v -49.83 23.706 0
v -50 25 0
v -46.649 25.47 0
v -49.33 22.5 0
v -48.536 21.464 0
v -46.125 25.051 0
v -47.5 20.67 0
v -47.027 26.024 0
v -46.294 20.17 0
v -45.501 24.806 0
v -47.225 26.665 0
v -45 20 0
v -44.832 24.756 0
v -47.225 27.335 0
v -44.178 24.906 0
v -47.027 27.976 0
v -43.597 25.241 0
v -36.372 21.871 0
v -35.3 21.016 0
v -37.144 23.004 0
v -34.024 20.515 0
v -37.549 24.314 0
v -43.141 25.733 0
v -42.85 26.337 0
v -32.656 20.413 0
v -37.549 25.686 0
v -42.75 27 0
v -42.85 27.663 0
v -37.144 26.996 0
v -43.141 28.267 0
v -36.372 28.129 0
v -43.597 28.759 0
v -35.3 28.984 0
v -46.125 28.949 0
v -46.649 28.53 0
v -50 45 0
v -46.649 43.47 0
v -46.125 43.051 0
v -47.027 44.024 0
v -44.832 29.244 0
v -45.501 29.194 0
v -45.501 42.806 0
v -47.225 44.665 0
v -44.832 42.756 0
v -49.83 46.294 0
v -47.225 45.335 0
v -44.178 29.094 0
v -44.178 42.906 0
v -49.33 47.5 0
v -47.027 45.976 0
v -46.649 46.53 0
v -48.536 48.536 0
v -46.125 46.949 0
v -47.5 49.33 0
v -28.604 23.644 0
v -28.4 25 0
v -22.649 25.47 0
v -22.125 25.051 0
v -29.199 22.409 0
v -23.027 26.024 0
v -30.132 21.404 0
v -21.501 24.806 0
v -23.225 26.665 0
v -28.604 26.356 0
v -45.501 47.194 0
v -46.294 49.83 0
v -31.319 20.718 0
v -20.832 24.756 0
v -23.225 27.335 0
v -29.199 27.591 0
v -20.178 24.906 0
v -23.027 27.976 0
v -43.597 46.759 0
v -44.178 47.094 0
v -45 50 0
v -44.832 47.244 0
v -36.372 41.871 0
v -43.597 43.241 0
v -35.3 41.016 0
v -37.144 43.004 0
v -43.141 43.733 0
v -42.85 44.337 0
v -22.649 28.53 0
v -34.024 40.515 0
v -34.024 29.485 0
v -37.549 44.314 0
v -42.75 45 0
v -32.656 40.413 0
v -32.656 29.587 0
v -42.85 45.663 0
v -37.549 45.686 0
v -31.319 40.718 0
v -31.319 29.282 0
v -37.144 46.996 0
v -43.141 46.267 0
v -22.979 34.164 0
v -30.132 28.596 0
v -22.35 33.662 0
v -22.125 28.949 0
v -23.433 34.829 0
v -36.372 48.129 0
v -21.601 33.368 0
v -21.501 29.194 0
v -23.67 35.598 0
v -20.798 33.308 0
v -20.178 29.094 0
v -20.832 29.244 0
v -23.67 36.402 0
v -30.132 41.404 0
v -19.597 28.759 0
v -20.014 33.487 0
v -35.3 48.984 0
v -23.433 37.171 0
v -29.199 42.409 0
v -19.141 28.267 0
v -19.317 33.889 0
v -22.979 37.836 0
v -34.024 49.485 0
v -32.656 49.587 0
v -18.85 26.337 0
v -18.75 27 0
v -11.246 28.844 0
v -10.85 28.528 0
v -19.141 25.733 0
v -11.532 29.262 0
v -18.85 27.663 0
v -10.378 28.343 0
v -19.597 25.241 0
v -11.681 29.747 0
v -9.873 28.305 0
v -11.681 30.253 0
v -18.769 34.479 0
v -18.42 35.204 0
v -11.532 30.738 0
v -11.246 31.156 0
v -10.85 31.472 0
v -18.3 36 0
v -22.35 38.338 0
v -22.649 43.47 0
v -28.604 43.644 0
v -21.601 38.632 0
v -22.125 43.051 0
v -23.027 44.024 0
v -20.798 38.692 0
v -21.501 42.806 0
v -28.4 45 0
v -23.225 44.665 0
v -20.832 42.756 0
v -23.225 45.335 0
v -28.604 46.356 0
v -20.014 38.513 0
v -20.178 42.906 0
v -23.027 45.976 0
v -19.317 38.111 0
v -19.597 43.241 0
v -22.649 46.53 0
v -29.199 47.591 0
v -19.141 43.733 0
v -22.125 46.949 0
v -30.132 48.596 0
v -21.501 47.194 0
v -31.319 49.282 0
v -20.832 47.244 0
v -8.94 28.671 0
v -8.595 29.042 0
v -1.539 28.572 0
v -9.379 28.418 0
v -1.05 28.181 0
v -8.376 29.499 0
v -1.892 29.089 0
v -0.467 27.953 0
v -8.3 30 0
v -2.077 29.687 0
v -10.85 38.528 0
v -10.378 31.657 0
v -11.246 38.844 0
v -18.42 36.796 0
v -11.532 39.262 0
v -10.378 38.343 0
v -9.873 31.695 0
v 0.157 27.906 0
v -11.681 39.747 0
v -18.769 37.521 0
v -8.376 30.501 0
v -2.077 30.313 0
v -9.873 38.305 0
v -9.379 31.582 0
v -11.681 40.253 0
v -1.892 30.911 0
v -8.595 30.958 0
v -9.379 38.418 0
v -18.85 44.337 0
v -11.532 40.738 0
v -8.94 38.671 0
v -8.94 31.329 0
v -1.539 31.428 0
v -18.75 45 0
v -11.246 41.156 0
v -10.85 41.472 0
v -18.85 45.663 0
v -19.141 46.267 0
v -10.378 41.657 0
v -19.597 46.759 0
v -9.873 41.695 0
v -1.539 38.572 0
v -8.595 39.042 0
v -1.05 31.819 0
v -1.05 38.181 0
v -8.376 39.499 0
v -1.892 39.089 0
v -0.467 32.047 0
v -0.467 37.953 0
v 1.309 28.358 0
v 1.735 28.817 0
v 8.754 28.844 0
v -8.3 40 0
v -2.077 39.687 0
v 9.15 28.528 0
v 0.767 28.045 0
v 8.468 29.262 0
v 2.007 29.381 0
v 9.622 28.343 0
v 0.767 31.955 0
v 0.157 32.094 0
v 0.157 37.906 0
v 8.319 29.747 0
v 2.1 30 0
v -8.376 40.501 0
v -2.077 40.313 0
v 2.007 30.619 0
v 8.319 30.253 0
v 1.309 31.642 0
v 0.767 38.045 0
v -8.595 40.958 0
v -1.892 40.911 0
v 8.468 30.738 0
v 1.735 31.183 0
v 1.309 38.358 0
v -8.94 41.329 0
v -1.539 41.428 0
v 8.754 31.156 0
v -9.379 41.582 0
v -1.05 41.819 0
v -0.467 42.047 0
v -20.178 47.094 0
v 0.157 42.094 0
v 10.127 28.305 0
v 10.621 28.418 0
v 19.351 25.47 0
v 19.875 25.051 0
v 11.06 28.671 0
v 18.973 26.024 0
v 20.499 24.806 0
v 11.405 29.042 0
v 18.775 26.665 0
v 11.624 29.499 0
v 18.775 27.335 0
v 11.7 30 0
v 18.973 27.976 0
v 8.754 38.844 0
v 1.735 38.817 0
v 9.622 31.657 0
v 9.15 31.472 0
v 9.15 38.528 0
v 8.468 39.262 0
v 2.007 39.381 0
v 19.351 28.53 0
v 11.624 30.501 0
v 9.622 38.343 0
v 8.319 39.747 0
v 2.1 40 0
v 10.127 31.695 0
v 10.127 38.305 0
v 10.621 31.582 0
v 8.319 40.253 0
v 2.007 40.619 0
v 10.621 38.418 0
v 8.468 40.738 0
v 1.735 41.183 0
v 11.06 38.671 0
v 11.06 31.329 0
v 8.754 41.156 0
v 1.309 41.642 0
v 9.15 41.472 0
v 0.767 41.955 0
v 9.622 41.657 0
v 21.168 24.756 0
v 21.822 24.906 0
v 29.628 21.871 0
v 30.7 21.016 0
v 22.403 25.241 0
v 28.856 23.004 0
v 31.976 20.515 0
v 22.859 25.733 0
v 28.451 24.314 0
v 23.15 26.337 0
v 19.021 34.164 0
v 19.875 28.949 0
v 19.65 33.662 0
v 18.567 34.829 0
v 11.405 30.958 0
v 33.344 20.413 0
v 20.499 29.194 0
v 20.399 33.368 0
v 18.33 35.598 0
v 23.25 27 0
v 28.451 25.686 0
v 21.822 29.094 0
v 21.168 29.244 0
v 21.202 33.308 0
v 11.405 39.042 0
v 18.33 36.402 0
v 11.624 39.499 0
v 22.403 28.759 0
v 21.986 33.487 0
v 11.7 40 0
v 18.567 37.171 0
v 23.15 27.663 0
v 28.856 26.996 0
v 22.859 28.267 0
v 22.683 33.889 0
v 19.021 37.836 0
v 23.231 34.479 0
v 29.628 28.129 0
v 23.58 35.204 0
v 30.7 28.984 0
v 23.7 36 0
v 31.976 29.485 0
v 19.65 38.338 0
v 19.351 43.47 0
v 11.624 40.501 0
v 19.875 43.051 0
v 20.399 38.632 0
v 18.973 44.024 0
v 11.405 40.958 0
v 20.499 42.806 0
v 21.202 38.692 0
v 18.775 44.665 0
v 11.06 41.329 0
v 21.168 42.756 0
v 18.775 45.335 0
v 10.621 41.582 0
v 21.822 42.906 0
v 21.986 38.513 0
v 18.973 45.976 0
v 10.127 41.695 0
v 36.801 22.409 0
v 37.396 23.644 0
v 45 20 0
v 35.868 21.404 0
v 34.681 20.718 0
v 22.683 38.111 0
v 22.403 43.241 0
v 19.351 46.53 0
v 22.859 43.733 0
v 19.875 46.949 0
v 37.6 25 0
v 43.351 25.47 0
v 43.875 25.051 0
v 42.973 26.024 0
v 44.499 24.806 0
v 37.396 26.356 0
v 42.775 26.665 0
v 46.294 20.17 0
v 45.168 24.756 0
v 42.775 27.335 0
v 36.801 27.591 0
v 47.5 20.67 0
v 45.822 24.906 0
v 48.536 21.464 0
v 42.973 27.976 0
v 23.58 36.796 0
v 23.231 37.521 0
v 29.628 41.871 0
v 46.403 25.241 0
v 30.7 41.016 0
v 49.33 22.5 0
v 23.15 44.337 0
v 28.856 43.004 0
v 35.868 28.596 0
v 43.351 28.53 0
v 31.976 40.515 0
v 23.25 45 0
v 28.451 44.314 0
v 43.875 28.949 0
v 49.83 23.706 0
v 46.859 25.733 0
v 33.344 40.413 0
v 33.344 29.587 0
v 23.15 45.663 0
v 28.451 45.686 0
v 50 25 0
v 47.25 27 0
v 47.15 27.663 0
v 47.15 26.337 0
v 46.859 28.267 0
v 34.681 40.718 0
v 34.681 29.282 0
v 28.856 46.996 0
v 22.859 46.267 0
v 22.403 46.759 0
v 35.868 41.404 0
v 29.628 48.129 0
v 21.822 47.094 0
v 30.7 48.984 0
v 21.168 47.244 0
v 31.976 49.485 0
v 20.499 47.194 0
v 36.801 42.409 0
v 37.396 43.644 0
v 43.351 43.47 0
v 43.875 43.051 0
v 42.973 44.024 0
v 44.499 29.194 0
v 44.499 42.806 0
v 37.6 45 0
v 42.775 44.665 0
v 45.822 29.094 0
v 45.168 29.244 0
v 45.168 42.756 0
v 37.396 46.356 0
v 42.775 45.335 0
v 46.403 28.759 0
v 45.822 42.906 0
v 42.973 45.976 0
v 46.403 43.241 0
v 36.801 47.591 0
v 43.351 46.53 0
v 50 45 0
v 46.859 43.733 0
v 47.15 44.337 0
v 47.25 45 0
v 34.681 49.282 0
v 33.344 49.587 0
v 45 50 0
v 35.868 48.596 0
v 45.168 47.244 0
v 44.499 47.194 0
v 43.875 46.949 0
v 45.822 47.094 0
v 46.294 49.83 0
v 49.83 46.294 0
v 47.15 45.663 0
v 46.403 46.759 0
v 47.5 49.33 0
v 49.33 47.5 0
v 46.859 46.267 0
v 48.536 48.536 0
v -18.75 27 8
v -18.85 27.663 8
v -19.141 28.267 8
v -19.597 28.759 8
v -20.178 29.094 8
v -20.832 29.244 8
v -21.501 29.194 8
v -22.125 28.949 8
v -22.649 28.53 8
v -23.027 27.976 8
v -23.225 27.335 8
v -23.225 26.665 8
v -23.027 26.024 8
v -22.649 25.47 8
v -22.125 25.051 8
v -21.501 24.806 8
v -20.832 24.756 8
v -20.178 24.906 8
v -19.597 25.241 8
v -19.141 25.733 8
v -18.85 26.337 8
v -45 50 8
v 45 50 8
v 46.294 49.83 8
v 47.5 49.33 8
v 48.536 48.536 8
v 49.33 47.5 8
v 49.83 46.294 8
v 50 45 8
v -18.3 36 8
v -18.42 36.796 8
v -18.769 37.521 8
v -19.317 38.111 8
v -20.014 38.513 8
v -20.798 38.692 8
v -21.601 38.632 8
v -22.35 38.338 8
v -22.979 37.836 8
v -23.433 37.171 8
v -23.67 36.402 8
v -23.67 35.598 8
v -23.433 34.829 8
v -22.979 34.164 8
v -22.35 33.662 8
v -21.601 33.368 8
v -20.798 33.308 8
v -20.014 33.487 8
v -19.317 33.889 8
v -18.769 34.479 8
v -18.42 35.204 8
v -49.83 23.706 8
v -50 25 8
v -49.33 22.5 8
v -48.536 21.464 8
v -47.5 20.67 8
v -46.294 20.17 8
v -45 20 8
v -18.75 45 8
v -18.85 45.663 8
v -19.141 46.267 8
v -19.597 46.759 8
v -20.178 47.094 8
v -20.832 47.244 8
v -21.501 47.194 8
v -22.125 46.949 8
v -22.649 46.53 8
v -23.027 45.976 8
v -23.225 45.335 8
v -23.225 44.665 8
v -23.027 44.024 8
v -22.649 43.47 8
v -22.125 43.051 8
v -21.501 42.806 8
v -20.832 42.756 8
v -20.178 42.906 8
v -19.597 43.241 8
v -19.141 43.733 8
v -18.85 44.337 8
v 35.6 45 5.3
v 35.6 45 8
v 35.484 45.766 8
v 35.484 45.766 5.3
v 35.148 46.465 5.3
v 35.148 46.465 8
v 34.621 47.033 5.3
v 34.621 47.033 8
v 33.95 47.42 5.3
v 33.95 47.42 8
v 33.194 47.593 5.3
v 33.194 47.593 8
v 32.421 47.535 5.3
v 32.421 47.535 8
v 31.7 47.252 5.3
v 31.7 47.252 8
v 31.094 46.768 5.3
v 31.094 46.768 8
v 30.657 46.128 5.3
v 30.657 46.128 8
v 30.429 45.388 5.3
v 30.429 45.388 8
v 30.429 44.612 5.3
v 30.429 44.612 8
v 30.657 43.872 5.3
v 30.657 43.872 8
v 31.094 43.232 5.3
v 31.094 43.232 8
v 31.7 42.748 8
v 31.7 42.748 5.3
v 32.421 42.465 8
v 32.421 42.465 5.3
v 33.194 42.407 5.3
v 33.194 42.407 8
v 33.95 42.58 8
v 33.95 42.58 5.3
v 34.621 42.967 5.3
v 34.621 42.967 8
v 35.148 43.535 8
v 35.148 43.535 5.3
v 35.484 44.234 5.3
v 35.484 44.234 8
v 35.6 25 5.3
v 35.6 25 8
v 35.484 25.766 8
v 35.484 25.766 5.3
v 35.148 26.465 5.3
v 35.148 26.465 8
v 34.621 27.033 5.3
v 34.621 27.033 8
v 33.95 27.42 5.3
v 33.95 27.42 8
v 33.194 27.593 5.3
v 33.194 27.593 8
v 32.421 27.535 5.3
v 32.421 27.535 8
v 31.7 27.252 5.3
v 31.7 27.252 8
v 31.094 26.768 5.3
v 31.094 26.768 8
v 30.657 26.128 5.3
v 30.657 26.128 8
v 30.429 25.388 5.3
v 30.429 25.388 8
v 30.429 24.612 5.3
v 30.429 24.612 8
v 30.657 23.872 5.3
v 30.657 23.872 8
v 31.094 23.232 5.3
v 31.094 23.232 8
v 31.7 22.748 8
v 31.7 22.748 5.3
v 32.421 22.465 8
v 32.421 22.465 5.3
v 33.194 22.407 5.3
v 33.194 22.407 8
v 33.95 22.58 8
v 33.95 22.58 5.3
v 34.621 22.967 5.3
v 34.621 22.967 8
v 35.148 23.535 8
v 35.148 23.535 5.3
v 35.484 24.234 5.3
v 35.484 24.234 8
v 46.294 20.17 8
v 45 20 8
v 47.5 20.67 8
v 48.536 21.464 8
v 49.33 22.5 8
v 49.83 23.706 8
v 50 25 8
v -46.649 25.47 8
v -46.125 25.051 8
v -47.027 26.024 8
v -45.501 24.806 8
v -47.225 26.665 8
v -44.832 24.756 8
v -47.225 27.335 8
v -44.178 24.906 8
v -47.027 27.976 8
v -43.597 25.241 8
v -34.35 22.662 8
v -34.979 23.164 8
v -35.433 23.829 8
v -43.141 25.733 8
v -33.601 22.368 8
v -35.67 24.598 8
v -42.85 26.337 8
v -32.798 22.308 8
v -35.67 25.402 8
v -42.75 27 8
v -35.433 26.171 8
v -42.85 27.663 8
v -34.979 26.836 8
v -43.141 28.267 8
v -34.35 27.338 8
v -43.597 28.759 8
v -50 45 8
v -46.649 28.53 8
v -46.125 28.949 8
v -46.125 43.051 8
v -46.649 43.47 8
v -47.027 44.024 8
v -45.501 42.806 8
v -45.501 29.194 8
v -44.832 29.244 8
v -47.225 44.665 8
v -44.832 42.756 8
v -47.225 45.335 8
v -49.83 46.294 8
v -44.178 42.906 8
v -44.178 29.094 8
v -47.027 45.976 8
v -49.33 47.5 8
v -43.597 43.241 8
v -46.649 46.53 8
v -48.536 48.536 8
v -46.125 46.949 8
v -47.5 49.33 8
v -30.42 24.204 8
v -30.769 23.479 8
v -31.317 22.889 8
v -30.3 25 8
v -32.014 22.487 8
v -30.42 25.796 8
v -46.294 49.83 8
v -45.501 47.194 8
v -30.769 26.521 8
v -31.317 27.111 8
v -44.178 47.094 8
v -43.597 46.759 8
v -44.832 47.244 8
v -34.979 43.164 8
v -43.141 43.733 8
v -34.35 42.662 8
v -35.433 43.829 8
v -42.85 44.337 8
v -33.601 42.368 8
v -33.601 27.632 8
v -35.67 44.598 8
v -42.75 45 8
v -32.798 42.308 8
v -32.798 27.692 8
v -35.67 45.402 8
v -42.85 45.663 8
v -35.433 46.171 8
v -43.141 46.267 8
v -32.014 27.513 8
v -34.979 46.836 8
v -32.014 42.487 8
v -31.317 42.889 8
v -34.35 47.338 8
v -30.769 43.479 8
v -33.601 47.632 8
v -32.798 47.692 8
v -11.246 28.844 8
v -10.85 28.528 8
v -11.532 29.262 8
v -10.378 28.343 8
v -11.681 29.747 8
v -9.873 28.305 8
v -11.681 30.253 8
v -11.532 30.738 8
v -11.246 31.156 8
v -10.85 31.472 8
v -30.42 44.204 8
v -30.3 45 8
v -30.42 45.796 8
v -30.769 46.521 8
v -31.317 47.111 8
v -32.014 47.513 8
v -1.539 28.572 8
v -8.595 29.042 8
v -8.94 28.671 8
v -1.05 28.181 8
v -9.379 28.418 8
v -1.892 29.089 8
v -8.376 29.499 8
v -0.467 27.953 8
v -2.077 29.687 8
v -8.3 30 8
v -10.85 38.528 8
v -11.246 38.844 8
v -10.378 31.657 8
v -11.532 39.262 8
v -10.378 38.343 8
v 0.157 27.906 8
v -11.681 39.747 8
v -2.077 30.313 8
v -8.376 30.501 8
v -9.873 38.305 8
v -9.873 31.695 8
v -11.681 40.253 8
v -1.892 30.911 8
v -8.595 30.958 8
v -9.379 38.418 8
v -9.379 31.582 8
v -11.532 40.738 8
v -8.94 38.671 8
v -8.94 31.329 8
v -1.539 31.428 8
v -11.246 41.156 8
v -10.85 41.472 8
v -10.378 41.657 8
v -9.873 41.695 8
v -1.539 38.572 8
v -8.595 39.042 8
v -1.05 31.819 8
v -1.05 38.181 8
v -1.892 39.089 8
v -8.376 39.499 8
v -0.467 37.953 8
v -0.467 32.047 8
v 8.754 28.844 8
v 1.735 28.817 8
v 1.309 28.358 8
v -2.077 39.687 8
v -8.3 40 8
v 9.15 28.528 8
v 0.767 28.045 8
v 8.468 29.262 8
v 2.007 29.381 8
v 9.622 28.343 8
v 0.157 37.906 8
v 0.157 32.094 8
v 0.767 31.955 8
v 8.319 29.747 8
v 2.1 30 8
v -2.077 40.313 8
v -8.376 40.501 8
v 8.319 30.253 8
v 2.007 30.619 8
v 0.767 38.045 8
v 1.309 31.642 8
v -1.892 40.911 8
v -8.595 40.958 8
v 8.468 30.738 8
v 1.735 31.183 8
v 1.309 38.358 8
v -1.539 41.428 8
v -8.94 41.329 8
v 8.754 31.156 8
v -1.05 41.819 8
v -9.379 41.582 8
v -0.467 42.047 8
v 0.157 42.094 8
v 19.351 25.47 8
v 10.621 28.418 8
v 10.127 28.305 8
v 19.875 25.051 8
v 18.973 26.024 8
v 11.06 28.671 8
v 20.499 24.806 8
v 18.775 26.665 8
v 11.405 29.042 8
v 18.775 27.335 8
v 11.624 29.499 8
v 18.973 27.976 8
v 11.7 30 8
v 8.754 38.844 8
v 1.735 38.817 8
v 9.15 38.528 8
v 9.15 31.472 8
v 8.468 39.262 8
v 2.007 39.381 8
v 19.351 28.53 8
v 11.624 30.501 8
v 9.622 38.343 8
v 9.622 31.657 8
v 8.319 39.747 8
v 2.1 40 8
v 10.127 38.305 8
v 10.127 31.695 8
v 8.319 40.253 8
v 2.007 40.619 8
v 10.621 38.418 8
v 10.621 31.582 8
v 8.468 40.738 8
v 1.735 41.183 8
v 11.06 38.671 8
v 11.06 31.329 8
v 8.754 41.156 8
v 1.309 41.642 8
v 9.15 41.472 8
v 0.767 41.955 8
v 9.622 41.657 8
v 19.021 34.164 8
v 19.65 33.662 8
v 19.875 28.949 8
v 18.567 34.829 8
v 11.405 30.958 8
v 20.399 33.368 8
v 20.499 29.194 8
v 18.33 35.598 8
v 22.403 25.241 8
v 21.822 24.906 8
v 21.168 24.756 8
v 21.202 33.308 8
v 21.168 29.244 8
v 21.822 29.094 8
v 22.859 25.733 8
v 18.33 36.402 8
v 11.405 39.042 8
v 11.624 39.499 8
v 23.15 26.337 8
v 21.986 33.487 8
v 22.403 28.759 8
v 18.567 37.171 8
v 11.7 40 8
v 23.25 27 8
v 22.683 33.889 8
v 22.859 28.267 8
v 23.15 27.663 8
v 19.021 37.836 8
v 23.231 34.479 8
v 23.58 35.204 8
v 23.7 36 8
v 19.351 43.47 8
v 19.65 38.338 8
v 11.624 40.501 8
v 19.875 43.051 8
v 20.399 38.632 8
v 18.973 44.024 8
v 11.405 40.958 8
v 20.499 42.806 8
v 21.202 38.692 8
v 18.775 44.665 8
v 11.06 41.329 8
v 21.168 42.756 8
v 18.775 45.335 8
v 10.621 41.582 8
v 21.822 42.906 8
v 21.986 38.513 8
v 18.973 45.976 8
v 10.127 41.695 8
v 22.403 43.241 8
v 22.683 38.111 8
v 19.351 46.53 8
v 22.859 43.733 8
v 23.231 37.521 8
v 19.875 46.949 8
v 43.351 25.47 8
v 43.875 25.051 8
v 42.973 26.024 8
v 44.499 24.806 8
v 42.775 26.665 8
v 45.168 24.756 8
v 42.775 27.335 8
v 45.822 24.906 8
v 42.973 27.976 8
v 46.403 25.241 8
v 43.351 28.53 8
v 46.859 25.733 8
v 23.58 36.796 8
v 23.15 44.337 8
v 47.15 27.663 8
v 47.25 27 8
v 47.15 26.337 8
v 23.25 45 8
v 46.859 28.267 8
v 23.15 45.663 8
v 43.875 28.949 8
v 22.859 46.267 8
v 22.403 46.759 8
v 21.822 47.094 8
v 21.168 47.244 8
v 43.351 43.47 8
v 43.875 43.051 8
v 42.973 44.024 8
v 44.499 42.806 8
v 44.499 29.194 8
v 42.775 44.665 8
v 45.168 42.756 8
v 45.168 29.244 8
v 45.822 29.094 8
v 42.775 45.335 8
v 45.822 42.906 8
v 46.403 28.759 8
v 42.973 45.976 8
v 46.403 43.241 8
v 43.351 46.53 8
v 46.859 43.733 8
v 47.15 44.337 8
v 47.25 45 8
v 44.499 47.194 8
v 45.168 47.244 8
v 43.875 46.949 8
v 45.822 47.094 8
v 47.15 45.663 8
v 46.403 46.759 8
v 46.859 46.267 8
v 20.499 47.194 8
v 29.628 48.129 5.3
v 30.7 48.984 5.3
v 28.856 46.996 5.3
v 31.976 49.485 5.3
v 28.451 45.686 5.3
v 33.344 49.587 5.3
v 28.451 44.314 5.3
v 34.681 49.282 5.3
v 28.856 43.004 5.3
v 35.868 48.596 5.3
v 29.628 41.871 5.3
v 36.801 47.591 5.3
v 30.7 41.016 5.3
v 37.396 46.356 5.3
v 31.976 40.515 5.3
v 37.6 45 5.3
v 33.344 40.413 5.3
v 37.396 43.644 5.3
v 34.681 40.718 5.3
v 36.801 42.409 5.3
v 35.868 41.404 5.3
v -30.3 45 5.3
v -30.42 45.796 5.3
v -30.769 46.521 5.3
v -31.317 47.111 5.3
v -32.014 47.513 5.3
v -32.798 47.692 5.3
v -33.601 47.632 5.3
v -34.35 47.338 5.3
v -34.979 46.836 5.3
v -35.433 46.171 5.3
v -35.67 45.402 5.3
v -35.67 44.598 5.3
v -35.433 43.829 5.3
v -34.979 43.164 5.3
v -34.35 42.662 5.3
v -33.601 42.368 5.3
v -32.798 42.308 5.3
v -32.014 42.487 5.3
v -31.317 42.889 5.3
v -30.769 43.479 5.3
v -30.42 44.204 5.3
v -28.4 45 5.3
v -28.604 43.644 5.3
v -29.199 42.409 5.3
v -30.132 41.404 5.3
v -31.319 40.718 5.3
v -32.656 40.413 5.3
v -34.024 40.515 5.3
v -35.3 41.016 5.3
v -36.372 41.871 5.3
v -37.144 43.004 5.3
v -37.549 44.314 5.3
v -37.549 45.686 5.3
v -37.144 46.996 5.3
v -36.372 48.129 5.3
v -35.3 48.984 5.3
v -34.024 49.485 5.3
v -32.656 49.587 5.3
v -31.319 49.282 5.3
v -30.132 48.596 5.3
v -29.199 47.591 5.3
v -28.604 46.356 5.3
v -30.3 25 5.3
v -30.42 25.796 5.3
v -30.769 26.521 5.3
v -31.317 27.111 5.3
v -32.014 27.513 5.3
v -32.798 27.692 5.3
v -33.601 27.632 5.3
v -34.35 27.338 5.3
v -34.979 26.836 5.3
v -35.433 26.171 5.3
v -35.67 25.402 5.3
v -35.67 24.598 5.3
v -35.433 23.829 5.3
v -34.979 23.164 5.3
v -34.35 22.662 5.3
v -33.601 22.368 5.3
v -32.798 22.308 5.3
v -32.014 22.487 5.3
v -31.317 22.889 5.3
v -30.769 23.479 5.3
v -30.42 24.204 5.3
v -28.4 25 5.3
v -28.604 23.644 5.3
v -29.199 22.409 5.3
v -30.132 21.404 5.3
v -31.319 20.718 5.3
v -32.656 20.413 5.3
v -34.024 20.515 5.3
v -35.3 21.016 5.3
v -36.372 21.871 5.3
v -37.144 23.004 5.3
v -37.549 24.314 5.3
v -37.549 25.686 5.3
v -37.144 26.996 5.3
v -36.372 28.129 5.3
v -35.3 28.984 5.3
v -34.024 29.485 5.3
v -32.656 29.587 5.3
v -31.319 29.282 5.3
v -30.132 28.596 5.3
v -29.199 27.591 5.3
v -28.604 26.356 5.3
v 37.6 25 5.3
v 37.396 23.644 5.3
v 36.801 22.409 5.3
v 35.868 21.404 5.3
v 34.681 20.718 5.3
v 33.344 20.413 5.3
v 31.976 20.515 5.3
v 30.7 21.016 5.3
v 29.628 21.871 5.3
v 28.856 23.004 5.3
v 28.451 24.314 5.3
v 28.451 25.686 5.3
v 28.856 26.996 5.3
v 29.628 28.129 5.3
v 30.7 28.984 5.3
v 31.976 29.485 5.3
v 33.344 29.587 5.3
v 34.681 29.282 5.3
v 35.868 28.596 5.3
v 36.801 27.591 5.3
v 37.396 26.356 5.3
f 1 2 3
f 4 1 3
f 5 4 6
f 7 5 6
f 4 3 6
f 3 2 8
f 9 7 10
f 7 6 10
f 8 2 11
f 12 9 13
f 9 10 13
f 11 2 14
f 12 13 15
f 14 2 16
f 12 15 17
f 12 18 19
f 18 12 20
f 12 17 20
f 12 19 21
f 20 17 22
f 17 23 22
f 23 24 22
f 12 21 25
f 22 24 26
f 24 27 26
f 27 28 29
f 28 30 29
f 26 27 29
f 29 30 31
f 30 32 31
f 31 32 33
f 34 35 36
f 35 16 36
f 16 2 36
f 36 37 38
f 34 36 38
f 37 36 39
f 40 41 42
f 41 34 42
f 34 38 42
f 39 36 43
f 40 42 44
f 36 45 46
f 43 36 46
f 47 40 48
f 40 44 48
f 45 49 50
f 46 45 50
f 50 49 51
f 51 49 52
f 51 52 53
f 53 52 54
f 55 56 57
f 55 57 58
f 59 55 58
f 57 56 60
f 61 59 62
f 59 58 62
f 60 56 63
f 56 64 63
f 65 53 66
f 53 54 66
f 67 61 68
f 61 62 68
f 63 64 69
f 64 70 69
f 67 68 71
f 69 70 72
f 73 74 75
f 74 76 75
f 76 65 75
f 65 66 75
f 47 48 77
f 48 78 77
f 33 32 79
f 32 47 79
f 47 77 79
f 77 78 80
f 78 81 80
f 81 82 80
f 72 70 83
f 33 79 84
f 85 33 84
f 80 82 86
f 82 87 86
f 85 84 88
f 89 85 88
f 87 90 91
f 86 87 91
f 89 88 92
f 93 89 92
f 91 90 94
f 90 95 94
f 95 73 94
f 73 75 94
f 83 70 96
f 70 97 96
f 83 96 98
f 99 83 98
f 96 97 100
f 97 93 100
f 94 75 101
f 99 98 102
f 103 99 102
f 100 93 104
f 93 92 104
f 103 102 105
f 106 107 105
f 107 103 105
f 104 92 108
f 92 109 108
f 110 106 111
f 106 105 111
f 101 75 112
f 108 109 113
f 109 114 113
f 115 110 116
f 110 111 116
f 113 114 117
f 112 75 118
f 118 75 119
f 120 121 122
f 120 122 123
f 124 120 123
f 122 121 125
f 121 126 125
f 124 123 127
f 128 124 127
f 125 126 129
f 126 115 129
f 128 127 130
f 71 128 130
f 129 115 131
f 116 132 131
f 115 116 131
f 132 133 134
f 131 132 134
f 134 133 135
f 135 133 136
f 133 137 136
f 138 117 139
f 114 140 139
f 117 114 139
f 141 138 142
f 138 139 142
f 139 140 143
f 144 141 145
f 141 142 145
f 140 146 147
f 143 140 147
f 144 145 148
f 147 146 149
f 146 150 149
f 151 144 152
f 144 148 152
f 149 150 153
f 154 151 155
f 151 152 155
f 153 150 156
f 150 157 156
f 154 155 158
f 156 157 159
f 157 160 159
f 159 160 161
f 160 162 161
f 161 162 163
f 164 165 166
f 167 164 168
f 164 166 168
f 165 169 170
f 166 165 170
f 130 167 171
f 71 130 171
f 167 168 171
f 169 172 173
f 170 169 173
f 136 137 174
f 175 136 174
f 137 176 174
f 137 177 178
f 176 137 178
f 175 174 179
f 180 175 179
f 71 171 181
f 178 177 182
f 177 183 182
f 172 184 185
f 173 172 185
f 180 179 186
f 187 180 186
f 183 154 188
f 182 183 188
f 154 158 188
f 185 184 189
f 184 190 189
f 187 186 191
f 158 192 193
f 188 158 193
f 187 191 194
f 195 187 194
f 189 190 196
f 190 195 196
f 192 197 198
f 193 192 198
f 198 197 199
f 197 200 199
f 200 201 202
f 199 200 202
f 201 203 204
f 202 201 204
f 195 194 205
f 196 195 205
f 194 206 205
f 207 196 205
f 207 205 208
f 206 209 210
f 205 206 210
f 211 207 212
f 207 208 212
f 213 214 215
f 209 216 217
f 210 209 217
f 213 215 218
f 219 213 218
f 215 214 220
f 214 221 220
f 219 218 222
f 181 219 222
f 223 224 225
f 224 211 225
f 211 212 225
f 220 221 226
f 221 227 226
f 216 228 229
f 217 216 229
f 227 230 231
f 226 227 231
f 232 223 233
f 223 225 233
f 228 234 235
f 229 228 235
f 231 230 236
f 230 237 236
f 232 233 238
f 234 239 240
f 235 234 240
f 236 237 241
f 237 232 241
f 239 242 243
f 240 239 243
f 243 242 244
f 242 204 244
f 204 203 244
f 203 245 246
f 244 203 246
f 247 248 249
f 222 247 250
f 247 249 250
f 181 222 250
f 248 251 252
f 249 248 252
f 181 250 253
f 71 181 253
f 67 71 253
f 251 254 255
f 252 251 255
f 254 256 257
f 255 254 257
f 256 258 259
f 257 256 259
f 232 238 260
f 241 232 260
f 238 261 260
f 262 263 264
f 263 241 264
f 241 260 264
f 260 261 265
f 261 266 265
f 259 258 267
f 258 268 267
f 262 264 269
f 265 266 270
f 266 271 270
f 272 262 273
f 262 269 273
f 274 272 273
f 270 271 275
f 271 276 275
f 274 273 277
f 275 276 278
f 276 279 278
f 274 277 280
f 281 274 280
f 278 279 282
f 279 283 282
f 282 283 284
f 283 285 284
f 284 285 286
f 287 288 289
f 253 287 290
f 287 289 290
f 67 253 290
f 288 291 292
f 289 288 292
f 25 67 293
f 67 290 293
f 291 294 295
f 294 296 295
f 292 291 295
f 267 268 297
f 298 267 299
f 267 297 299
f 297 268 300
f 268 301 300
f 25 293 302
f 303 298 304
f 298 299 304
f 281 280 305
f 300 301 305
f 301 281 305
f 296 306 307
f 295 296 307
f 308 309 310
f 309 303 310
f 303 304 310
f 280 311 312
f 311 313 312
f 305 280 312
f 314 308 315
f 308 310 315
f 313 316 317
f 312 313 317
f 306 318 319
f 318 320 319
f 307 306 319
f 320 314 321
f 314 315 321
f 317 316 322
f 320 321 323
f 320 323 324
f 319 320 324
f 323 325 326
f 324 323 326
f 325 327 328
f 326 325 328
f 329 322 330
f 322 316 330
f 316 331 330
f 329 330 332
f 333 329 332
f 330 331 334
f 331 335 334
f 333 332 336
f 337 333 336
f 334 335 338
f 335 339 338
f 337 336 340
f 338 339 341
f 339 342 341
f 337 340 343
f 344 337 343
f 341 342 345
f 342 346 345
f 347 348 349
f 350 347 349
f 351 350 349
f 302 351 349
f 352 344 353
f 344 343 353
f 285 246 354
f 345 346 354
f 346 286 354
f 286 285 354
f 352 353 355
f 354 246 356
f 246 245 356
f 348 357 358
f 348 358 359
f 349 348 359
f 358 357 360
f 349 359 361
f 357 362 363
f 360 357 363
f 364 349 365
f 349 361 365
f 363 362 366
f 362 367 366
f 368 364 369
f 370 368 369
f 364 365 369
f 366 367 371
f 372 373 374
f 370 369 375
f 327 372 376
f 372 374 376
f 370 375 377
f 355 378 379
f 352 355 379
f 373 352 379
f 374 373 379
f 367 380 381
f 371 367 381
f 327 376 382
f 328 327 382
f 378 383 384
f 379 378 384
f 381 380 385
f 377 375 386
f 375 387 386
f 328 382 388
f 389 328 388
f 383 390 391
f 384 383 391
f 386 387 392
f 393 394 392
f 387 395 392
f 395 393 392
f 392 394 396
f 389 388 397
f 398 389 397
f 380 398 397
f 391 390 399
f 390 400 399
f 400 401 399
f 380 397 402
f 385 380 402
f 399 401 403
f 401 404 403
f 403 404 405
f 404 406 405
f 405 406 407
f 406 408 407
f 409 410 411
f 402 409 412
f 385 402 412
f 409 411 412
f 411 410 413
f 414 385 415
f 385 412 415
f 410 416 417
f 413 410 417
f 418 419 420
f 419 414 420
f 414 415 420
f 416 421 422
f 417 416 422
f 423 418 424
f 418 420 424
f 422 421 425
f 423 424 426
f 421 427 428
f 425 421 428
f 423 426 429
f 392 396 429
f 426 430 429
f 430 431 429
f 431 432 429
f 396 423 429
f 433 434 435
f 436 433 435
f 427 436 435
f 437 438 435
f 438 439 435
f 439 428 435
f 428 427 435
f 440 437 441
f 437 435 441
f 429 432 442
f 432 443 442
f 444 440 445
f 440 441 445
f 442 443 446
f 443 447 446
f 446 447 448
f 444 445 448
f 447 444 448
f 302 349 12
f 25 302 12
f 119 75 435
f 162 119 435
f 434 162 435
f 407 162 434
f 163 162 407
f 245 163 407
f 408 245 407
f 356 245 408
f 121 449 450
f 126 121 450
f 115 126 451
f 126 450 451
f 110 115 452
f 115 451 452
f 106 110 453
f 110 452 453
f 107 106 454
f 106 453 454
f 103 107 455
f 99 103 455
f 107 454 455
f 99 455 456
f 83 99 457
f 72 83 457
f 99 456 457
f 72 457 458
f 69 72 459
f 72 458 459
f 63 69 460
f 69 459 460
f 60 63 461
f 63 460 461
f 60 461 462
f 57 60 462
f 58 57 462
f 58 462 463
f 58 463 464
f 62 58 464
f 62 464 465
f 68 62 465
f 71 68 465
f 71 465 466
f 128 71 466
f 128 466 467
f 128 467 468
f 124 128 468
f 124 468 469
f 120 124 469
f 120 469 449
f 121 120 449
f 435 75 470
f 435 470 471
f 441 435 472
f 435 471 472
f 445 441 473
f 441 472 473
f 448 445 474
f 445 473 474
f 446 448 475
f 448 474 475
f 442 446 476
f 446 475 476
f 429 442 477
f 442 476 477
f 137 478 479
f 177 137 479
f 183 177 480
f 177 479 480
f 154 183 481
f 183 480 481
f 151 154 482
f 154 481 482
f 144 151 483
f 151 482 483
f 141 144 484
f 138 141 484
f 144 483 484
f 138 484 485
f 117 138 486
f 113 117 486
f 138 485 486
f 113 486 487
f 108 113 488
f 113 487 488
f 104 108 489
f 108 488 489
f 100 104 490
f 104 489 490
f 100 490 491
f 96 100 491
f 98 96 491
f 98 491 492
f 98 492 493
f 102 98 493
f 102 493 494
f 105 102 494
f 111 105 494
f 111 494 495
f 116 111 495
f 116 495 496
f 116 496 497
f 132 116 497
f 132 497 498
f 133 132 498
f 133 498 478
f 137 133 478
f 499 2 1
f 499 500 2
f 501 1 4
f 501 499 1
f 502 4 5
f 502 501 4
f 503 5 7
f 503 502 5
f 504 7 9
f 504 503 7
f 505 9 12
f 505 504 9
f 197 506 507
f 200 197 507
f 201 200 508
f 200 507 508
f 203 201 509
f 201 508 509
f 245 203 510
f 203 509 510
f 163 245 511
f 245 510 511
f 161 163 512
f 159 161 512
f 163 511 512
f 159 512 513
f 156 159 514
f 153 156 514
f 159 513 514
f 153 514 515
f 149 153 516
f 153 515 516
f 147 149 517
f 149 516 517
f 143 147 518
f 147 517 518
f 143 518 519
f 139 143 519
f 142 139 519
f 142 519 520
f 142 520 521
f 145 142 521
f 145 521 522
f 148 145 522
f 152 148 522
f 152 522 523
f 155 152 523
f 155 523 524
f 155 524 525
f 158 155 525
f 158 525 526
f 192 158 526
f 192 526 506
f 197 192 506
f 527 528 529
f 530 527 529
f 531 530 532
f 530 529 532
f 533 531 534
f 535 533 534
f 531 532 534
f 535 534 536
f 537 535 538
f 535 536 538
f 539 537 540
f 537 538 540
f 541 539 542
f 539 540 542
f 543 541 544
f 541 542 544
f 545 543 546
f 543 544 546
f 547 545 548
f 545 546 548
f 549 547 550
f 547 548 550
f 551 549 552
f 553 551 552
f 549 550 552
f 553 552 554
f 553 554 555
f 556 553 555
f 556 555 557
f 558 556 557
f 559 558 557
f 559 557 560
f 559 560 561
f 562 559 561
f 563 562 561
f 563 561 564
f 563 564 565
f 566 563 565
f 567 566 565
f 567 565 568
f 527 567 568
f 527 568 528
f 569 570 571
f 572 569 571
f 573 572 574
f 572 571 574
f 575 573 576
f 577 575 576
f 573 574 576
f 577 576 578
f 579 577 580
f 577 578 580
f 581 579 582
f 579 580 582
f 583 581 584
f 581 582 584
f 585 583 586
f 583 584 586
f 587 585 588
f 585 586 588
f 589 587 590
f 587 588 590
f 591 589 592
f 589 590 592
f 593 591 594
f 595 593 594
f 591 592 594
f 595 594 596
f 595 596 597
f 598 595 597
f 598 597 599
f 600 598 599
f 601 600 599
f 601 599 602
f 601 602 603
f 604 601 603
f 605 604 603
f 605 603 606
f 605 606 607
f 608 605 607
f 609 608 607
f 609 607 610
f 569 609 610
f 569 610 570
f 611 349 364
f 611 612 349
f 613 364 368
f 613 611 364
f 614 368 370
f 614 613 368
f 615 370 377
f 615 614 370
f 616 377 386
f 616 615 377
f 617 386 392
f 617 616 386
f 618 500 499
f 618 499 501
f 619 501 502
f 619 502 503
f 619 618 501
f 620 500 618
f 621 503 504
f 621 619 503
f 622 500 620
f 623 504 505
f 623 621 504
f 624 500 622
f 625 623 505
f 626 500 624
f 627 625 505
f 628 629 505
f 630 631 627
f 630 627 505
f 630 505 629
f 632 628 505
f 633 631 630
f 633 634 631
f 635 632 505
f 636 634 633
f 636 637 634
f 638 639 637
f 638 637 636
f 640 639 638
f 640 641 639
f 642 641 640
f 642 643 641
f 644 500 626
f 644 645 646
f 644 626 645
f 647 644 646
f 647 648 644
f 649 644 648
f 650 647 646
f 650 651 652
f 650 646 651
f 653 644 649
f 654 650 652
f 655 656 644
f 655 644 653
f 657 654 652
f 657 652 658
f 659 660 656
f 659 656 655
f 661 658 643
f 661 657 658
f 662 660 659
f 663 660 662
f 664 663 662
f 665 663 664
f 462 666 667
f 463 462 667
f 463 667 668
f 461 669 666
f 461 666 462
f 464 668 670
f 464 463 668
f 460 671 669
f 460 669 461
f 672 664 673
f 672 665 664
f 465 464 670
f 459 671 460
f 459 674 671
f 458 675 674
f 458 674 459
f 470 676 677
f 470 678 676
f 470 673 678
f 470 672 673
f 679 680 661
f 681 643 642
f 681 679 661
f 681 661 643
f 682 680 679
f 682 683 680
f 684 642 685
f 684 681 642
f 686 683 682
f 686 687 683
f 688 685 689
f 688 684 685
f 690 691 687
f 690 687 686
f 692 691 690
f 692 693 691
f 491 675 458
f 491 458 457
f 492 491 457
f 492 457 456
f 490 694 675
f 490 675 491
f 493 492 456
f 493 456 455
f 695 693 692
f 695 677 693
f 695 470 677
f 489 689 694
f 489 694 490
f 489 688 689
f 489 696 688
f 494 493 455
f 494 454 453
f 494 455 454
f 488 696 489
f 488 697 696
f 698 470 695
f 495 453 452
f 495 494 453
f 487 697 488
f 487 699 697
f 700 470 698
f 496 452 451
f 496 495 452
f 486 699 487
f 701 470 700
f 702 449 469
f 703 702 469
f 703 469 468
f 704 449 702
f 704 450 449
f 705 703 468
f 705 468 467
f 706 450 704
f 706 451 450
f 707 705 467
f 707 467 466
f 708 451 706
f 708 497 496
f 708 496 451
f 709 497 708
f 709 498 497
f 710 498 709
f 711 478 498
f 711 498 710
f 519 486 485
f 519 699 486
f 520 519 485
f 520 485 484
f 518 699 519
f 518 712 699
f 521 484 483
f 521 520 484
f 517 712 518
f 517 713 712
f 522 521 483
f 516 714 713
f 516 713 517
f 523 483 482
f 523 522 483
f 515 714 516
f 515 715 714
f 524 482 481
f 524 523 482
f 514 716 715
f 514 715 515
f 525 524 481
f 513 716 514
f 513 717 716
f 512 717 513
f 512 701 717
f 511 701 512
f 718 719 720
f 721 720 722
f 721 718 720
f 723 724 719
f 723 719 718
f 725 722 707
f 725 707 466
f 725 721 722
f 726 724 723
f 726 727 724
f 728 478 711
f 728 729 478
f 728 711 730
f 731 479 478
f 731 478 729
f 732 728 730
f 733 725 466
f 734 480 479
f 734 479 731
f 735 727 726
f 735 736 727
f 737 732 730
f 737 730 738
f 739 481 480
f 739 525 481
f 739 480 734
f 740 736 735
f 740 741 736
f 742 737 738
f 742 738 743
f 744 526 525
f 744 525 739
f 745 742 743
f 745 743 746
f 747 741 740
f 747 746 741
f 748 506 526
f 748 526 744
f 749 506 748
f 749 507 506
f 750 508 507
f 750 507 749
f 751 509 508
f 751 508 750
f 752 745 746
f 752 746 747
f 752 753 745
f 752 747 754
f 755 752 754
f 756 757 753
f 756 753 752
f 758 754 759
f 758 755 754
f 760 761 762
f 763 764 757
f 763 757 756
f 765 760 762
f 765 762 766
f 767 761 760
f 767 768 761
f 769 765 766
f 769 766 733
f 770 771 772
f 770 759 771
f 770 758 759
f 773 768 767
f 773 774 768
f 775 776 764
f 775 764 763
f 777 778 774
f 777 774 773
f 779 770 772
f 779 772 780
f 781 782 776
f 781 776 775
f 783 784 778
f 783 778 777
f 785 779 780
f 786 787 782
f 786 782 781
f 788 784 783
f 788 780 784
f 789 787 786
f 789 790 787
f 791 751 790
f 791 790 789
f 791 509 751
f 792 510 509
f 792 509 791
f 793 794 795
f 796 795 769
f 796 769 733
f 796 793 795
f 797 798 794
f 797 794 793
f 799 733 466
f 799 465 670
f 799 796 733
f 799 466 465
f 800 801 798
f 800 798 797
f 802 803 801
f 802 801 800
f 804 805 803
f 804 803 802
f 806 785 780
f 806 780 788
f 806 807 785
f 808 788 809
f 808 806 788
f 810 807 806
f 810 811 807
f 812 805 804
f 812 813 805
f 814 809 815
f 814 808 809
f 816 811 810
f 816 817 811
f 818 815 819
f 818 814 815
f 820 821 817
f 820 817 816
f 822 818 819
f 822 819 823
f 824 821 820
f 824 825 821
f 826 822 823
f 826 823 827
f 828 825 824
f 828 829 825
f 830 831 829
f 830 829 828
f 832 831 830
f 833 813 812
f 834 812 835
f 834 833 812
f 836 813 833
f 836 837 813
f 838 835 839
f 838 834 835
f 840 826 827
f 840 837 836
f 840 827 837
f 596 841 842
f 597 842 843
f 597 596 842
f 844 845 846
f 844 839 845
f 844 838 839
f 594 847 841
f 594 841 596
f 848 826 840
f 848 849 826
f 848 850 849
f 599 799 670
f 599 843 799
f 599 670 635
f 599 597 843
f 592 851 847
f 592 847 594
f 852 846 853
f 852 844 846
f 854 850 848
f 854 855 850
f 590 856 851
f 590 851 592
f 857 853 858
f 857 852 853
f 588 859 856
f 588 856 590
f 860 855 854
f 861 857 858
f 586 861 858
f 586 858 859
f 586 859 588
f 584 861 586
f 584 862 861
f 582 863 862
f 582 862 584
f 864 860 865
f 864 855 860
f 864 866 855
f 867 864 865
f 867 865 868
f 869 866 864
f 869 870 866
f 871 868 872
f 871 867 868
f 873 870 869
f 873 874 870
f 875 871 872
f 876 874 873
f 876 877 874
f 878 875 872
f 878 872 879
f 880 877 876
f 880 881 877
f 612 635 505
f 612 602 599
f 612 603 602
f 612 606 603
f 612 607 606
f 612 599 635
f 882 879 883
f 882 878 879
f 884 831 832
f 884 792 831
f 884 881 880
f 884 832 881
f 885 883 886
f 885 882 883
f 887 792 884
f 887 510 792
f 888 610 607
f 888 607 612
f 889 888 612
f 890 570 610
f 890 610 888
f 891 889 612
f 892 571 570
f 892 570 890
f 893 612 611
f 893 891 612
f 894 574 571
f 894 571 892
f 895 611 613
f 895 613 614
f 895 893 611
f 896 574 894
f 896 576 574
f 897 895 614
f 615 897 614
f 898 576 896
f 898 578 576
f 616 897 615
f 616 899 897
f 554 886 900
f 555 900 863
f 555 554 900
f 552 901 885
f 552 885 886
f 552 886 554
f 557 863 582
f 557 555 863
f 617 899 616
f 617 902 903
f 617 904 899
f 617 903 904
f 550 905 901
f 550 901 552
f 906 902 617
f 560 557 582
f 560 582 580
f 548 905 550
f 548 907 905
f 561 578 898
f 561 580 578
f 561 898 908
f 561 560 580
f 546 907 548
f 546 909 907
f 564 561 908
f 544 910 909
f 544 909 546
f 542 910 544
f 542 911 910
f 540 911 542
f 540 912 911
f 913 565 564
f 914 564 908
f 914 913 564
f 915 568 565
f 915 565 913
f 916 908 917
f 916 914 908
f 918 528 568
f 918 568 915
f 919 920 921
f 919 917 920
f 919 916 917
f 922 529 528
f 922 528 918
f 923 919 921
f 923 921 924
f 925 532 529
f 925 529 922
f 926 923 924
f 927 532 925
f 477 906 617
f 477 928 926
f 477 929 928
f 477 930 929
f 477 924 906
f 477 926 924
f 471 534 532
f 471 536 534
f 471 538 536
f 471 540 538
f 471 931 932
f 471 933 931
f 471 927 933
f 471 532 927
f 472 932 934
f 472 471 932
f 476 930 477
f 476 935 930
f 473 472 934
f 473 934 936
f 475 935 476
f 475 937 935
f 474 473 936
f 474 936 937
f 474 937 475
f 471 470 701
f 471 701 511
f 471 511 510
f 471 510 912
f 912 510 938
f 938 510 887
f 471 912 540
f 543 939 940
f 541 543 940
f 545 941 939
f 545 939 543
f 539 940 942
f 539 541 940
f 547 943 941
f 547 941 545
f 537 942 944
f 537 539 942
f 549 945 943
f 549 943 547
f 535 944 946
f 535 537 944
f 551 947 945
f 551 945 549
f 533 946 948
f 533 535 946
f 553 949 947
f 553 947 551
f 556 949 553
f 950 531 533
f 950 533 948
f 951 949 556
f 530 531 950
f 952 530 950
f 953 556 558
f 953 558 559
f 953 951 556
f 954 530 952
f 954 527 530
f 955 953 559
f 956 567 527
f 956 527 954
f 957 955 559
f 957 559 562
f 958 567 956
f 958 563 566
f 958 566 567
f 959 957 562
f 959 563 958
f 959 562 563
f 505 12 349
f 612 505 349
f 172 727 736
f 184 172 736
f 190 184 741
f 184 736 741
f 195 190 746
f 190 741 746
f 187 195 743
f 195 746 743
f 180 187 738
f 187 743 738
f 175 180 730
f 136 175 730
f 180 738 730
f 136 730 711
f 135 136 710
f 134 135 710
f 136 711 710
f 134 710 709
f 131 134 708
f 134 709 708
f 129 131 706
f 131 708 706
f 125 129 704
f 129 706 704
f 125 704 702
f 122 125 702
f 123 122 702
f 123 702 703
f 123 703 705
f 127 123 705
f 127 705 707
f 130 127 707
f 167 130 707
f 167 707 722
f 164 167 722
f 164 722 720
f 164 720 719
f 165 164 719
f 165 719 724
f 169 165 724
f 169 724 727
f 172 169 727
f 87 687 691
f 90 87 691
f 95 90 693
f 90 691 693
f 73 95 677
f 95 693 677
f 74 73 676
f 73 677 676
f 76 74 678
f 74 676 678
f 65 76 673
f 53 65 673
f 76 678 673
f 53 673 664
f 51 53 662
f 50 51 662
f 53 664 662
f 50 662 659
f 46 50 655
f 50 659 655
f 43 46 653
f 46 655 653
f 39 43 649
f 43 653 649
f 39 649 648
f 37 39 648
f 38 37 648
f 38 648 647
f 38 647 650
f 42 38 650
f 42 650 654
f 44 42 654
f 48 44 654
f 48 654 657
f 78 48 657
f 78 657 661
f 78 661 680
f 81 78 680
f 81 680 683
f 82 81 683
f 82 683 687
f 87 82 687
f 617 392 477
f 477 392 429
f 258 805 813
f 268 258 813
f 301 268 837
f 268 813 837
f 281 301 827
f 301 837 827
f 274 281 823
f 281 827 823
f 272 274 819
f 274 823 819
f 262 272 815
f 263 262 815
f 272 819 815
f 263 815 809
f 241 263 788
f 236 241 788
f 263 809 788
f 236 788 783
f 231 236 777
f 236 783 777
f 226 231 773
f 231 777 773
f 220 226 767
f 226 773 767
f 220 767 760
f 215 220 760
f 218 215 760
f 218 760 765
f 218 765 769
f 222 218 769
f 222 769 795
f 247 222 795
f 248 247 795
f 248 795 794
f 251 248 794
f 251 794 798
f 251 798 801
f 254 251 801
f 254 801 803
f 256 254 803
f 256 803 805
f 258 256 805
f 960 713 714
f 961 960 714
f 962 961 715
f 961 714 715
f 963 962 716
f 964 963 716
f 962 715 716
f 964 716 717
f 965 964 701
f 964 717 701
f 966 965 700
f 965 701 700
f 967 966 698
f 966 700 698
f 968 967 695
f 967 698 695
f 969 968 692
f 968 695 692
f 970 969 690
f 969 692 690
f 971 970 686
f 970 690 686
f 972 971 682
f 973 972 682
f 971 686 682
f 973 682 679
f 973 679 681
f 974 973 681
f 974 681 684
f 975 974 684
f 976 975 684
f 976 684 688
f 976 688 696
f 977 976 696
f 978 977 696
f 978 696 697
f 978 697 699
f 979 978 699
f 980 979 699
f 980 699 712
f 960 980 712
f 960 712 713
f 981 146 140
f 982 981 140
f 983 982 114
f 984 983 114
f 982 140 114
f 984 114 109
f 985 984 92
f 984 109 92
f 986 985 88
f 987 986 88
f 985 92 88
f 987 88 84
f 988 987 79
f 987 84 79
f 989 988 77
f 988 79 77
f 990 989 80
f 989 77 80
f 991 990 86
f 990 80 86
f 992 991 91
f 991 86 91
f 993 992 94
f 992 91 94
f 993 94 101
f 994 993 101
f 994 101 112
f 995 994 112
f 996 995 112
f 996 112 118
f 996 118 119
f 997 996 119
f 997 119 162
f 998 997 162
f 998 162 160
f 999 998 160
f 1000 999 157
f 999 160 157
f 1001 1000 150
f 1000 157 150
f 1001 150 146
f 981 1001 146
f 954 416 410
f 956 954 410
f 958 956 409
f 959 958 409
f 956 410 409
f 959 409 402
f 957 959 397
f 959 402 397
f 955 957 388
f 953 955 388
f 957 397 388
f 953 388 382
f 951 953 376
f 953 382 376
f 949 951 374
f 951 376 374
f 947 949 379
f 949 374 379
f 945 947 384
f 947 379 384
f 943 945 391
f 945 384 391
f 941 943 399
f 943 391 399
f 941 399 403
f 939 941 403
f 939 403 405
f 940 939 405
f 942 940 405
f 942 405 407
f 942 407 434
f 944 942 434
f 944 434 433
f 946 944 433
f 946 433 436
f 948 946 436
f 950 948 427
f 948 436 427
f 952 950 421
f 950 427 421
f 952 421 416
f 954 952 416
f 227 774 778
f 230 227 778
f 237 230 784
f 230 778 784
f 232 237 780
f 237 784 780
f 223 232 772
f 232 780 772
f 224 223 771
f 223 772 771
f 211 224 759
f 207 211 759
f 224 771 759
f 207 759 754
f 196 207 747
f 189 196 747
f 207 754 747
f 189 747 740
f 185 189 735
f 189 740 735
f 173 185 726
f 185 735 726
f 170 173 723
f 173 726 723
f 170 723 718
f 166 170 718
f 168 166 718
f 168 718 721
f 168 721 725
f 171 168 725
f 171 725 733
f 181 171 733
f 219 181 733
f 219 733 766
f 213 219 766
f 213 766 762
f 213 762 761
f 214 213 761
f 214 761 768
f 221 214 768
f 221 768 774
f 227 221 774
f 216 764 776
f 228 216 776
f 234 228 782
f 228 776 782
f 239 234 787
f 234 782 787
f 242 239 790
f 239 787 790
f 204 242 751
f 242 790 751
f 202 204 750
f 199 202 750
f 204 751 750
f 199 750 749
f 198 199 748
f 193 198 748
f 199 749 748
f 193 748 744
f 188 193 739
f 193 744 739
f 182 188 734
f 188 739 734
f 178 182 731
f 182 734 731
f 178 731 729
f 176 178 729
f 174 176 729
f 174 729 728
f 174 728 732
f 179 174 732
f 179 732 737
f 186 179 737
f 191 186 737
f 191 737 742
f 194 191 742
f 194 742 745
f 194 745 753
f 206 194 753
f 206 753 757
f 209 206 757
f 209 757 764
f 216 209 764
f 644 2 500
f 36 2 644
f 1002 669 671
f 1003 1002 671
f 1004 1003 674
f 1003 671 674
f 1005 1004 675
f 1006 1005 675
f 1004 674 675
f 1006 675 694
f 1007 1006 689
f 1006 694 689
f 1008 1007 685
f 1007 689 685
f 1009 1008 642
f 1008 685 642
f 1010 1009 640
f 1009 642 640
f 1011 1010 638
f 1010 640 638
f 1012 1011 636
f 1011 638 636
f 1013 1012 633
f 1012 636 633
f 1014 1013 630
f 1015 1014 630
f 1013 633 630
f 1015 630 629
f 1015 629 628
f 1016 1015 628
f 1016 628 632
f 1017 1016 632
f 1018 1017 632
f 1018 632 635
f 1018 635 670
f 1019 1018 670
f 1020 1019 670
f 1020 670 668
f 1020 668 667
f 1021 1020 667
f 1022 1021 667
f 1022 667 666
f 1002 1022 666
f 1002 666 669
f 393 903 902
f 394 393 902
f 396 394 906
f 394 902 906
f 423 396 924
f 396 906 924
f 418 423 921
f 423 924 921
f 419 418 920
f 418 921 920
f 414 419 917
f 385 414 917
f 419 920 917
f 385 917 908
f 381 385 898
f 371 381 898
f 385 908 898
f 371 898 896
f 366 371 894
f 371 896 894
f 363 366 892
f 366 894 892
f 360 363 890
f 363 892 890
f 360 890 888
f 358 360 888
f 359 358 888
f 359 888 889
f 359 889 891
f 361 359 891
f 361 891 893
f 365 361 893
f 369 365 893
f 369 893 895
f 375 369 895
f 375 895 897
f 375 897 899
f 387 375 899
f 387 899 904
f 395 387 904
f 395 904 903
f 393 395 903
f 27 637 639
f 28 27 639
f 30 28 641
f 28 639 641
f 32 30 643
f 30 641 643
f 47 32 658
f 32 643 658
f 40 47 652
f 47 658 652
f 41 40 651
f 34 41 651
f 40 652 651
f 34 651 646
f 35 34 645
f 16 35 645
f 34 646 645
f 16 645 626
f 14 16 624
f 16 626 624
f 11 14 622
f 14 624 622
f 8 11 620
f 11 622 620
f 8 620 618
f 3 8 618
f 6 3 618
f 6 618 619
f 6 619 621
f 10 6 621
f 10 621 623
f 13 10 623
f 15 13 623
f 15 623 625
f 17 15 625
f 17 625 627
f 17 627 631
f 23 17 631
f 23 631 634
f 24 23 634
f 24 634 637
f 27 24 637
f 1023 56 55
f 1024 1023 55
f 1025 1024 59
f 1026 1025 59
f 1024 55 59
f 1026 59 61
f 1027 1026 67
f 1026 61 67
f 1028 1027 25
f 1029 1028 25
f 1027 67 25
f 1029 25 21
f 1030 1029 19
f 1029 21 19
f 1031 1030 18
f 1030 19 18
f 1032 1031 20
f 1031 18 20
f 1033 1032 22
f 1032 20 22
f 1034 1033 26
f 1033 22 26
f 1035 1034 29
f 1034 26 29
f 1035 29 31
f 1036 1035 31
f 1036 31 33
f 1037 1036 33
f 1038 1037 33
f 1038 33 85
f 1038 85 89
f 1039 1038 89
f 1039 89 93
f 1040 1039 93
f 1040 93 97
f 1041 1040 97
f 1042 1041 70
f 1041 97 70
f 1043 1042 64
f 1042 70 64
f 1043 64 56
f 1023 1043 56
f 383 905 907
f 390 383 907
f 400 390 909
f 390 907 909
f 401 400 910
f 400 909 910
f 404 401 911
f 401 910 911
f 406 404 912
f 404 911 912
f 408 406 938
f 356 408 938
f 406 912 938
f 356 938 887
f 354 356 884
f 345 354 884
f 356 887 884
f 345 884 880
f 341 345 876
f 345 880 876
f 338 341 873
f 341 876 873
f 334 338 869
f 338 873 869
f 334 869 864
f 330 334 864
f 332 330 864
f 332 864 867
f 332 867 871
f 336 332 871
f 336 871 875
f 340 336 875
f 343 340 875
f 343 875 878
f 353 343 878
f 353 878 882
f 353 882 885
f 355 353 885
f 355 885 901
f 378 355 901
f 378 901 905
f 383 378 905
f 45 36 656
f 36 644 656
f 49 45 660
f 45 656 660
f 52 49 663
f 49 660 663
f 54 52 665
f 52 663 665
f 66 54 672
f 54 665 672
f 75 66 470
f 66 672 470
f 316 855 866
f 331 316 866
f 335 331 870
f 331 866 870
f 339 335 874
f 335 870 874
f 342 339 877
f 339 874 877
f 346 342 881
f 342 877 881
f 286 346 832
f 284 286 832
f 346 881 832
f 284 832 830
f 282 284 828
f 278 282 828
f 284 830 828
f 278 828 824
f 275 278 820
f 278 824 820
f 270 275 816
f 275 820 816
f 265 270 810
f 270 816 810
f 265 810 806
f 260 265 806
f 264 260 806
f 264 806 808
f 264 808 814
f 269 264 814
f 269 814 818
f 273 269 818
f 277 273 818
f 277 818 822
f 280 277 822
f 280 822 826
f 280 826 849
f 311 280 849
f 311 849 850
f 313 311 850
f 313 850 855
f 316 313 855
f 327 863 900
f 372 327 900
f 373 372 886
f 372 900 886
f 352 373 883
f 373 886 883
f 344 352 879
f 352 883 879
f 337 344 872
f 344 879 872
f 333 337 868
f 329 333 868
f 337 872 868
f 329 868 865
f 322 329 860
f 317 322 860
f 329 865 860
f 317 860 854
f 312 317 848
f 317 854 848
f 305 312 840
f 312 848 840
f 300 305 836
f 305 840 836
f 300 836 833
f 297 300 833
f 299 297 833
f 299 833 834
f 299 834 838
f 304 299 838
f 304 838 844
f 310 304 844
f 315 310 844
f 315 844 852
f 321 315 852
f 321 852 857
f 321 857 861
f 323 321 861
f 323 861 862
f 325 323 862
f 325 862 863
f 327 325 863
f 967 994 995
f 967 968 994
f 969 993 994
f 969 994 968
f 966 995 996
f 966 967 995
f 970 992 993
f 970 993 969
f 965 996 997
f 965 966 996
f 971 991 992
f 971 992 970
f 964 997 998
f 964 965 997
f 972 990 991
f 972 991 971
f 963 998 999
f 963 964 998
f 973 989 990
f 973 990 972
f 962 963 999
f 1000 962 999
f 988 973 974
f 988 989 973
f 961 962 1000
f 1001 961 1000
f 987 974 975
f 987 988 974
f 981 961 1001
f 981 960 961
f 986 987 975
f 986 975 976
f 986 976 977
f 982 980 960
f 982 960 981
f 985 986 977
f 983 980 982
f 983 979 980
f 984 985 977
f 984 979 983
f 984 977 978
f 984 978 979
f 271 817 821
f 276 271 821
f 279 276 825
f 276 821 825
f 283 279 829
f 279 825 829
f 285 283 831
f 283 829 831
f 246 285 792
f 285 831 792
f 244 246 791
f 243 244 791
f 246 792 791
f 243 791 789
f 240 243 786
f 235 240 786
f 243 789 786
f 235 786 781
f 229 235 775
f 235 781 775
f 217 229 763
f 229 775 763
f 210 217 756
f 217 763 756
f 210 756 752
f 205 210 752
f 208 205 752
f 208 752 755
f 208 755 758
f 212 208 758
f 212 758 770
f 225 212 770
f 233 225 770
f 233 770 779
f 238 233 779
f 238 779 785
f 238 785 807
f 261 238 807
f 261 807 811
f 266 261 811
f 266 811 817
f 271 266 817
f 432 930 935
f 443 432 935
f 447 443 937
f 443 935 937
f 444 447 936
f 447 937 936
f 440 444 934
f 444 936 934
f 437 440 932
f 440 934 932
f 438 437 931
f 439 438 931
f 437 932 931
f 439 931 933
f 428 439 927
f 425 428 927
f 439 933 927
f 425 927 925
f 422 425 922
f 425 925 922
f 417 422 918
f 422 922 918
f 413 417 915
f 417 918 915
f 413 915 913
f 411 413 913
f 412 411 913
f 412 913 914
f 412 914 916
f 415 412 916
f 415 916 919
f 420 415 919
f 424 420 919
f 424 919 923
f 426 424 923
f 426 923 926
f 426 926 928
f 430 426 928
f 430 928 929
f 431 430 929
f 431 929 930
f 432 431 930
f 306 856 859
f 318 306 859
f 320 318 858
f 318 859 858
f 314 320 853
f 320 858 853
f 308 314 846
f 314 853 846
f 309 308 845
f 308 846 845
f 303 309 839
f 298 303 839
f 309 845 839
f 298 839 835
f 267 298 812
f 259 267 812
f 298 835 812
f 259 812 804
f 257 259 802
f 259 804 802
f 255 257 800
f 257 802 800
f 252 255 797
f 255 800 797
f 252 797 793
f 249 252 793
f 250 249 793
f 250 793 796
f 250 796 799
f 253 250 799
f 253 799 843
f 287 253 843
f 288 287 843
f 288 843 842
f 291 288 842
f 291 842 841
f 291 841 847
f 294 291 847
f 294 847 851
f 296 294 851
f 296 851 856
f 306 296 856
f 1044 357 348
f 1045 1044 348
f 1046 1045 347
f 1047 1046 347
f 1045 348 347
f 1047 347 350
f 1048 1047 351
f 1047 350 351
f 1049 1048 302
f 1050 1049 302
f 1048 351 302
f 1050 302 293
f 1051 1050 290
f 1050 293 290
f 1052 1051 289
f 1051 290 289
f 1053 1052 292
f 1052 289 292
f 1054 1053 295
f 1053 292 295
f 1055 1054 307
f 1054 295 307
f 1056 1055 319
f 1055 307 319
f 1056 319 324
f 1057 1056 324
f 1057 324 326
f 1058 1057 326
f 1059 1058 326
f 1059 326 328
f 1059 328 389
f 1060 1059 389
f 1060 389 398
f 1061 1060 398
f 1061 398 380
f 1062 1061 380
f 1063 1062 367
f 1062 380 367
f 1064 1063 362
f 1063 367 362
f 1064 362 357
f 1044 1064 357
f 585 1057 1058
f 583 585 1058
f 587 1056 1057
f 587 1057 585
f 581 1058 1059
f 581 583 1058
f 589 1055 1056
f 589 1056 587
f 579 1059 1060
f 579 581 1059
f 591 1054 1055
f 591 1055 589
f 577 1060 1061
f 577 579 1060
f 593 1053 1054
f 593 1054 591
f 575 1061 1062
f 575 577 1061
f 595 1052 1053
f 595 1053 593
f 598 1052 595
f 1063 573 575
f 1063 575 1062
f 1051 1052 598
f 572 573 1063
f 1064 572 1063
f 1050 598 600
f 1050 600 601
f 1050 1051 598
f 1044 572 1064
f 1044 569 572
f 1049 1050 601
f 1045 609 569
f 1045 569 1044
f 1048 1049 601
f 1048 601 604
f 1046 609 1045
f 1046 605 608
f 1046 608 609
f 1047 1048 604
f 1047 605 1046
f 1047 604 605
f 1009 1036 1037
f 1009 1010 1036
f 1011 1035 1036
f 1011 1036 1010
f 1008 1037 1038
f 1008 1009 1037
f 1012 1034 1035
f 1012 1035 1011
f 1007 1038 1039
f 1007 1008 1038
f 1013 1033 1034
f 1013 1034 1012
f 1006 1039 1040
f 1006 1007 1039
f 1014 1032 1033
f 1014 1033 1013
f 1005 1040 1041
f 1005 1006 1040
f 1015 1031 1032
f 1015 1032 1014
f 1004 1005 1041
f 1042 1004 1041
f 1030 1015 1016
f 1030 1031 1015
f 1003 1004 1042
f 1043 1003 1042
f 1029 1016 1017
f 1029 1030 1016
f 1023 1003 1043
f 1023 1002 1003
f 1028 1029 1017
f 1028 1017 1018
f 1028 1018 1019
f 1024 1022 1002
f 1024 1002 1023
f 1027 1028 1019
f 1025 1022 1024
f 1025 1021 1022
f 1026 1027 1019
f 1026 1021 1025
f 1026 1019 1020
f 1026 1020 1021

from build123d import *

# Parameters (mm, degrees)
SKETCH_W        = 100
SKETCH_H        = 30
PAD_DEPTH       = 8
SKETCH001_R     = 2.25
SKETCH001_R_2   = 2.7
SKETCH001_R_3   = 2.6
SKETCH001_R_4   = 2.1
POCKET_DEPTH    = 8.001
SKETCH002_R     = 1.7
POCKET001_DEPTH = 8.001
SKETCH003_R     = 4.6
POCKET002_DEPTH = 5.3
FILLET_R        = 5


with BuildPart() as part:
    # Sketch → Pad (new body)
    with BuildSketch(Plane.XY):
        with Locations((0, 35)):
            Rectangle(SKETCH_W, SKETCH_H)
    extrude(amount=PAD_DEPTH)

    # Sketch001 → Pocket (cut, through all)
    with BuildSketch(Plane.XY.offset(8)):
        with Locations((-21, 45)):
            Circle(SKETCH001_R)
        with Locations((-45, 27)):
            Circle(SKETCH001_R)
        with Locations((-45, 45)):
            Circle(SKETCH001_R)
        with Locations((-21, 27)):
            Circle(SKETCH001_R)
        with Locations((21, 27)):
            Circle(SKETCH001_R)
        with Locations((21, 45)):
            Circle(SKETCH001_R)
        with Locations((45, 27)):
            Circle(SKETCH001_R)
        with Locations((45, 45)):
            Circle(SKETCH001_R)
        with Locations((-33, 45)):
            Circle(SKETCH001_R_2)
        with Locations((-33, 25)):
            Circle(SKETCH001_R_2)
        with Locations((33, 45)):
            Circle(SKETCH001_R_3)
        with Locations((33, 25)):
            Circle(SKETCH001_R_3)
        with Locations((-21, 36)):
            Circle(SKETCH001_R_2)
        with Locations((21, 36)):
            Circle(SKETCH001_R_2)
        with Locations((0, 30)):
            Circle(SKETCH001_R_4)
        with Locations((0, 40)):
            Circle(SKETCH001_R_4)
    extrude(amount=-POCKET_DEPTH, mode=Mode.SUBTRACT)

    # Sketch002 → Pocket001 (cut, through all)
    with BuildSketch(Plane.XY.offset(8)):
        with Locations((-10, 30)):
            Circle(SKETCH002_R)
        with Locations((-10, 40)):
            Circle(SKETCH002_R)
        with Locations((10, 40)):
            Circle(SKETCH002_R)
        with Locations((10, 30)):
            Circle(SKETCH002_R)
    extrude(amount=-POCKET001_DEPTH, mode=Mode.SUBTRACT)

    # Sketch003 → Pocket002 (cut)
    with BuildSketch(Plane(origin=(0, 0, 0), x_dir=(1, 0, 0), z_dir=(0, 0, -1))):
        with Locations((-33, -25)):
            Circle(SKETCH003_R)
        with Locations((33, -45)):
            Circle(SKETCH003_R)
        with Locations((33, -25)):
            Circle(SKETCH003_R)
        with Locations((-33, -45)):
            Circle(SKETCH003_R)
    extrude(amount=-POCKET002_DEPTH, mode=Mode.SUBTRACT)

    # Fillet
    fillet_edges = [part.edges().sort_by_distance(p)[0] for p in [
        (-50, 20, 4),
        (50, 20, 4),
        (-50, 50, 4),
        (50, 50, 4),
    ]]
    fillet(fillet_edges, radius=FILLET_R)


solid = part.part
